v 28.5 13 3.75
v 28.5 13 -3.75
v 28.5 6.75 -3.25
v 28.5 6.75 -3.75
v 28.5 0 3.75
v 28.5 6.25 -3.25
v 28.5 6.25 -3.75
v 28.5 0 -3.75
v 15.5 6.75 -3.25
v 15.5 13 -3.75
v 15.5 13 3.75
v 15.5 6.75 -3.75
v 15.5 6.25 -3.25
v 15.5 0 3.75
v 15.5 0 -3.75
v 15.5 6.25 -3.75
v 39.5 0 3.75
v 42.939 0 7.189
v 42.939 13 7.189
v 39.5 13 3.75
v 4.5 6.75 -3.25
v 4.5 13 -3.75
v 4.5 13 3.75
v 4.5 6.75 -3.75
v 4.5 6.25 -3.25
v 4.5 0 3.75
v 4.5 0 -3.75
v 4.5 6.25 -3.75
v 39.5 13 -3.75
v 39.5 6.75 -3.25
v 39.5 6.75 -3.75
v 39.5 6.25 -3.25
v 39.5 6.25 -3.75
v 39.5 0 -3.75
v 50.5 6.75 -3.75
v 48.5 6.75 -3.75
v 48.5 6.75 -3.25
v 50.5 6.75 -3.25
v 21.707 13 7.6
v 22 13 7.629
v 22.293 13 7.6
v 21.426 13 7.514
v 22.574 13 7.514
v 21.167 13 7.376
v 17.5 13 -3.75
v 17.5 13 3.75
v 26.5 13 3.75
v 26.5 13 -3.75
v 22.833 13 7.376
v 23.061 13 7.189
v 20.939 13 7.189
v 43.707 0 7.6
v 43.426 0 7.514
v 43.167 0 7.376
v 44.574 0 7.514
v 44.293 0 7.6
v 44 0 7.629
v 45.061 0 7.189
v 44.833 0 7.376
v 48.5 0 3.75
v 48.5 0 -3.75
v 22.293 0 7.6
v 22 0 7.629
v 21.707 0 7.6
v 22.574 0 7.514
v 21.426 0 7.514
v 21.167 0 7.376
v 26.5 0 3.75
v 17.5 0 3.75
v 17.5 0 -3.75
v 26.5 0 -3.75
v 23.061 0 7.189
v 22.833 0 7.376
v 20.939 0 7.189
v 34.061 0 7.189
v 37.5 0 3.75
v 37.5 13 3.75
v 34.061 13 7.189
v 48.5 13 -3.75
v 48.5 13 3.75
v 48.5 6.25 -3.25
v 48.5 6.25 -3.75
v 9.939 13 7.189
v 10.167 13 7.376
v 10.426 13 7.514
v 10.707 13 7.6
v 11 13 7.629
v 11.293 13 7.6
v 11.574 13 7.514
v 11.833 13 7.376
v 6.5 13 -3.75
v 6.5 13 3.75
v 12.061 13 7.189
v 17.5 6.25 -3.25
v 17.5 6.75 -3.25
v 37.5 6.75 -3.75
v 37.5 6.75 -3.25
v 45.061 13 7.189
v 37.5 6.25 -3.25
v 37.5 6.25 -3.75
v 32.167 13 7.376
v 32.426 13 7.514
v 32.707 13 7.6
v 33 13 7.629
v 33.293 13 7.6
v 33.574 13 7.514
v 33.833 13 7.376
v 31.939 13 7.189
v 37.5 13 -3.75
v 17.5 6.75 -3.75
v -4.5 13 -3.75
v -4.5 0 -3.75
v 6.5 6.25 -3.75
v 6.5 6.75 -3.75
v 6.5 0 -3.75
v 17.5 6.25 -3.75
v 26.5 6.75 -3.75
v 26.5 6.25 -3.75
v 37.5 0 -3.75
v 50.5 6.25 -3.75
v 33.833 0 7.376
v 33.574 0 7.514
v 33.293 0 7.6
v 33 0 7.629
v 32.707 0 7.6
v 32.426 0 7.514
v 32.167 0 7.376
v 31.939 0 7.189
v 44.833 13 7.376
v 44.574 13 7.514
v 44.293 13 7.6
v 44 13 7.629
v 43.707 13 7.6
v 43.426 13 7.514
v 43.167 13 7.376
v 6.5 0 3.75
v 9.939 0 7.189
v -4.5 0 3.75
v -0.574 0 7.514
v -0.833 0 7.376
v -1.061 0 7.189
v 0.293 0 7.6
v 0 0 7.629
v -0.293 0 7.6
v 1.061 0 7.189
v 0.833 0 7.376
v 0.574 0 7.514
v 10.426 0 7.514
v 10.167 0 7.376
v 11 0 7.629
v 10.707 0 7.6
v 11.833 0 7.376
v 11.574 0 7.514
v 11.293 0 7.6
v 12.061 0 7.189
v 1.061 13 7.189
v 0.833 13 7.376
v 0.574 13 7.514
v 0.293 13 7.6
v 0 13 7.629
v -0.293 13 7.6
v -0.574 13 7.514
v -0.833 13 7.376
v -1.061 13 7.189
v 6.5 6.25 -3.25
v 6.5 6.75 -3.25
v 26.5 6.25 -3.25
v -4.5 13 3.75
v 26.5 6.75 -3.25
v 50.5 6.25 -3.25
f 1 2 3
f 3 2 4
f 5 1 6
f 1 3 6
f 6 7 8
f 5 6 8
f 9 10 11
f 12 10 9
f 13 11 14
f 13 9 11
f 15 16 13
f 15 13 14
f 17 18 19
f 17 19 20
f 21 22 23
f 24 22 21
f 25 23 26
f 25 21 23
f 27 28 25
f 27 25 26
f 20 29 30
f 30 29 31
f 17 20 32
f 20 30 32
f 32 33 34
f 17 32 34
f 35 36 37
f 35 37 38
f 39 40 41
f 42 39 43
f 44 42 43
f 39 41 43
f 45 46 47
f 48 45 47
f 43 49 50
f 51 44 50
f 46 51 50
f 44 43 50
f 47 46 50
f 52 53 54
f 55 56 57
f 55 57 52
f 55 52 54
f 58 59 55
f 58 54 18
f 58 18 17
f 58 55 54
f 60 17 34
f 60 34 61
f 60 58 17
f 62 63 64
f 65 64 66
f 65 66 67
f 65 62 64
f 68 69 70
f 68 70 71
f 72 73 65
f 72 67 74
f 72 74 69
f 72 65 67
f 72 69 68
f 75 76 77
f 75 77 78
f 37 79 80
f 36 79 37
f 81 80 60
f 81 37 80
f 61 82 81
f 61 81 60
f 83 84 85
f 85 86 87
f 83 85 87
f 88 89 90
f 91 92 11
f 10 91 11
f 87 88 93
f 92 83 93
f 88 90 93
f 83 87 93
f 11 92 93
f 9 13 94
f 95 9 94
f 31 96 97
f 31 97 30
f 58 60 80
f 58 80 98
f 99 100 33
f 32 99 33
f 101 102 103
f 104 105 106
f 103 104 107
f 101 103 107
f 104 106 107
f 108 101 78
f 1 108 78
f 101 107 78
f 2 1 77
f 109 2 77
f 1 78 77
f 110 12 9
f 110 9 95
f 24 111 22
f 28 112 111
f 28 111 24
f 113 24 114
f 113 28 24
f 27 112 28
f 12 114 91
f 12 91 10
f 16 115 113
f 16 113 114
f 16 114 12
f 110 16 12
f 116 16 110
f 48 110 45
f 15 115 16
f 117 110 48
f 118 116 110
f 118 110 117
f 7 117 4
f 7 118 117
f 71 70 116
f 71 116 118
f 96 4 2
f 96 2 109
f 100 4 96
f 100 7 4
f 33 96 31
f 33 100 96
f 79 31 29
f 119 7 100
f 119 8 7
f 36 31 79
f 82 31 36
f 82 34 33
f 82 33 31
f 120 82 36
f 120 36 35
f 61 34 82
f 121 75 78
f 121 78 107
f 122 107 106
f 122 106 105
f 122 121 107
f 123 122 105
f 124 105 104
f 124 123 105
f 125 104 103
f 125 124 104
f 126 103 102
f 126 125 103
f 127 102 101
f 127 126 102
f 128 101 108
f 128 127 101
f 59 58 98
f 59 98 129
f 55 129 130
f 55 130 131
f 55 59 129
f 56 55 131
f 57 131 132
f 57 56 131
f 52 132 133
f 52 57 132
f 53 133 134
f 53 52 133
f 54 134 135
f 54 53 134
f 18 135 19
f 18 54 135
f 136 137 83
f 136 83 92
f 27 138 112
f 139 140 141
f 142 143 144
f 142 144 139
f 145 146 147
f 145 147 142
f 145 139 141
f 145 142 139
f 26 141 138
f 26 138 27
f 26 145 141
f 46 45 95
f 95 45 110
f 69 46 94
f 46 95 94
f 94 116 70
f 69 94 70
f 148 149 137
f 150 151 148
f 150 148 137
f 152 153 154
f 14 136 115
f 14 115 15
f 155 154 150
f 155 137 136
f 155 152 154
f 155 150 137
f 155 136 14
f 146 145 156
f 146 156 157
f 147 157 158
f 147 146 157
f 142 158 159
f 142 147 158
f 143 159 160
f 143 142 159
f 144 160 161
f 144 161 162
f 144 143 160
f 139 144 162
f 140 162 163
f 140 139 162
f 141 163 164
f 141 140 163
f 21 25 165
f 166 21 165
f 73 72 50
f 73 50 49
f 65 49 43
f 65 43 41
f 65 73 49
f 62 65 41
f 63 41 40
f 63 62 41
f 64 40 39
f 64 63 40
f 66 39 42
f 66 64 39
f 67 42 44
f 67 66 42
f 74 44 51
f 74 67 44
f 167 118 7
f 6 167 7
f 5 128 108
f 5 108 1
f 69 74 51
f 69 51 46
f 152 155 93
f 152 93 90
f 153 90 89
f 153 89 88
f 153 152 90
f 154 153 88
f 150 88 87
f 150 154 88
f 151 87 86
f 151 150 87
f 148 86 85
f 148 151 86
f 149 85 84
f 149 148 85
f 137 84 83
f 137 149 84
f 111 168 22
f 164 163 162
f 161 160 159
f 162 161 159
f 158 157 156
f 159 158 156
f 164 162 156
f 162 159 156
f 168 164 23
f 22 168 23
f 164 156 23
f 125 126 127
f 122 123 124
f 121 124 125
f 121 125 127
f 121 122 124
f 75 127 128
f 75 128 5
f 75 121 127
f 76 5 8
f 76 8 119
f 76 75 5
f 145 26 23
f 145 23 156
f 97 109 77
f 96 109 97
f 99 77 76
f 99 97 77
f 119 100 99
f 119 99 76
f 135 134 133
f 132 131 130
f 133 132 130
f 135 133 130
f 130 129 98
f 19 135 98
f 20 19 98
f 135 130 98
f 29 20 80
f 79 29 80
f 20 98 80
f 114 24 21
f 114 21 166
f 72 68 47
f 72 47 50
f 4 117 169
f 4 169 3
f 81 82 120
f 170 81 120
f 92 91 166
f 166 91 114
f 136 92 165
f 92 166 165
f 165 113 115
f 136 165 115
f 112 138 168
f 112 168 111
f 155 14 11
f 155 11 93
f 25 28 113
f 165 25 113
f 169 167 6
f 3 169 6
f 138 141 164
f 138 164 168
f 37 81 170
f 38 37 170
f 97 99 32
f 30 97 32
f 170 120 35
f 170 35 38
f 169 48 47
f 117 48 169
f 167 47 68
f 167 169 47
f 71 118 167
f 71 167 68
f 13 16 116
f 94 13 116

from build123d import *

# Parameters (mm, degrees)
F0_W     = 2
F0_H     = 0.5
F1_DEPTH = 13
F2_W     = 2
F2_H     = 6.25
F3_DEPTH = 11.37968


with BuildPart() as f1:
    # F0 (on Front) → F1 (new body)
    with BuildSketch(Plane.XZ):
        Polygon((-4.5, -3.75), (4.5, -3.75), (4.5, -3.25), (4.5, 3.75), (-4.5, 3.75), align=None)
        with Locations((5.5, -3.5)):
            Rectangle(F0_W, F0_H)
        Polygon((6.5, -3.25), (6.5, -3.75), (15.5, -3.75), (15.5, -3.25), (15.5, 3.75), (6.5, 3.75), align=None)
        with BuildLine():
            Line((-1.06066, 7.18934), (-4.5, 3.75))
            Line((-4.5, 3.75), (4.5, 3.75))
            Line((4.5, 3.75), (1.06066, 7.18934))
            ThreePointArc((1.06066, 7.18934), (0, 7.62868), (-1.06066, 7.18934))
        make_face()
        with Locations((16.5, -3.5)):
            Rectangle(F0_W, F0_H)
        with BuildLine():
            Line((9.93934, 7.18934), (6.5, 3.75))
            Line((6.5, 3.75), (15.5, 3.75))
            Line((15.5, 3.75), (12.06066, 7.18934))
            ThreePointArc((12.06066, 7.18934), (11, 7.62868), (9.93934, 7.18934))
        make_face()
        Polygon((17.5, -3.25), (17.5, -3.75), (26.5, -3.75), (26.5, -3.25), (26.5, 3.75), (17.5, 3.75), align=None)
        with Locations((27.5, -3.5)):
            Rectangle(F0_W, F0_H)
        with BuildLine():
            Line((20.93934, 7.18934), (17.5, 3.75))
            Line((17.5, 3.75), (26.5, 3.75))
            Line((26.5, 3.75), (23.06066, 7.18934))
            ThreePointArc((23.06066, 7.18934), (22, 7.62868), (20.93934, 7.18934))
        make_face()
        Polygon((28.5, -3.25), (28.5, -3.75), (37.5, -3.75), (37.5, -3.25), (37.5, 3.75), (28.5, 3.75), align=None)
        with Locations((38.5, -3.5)):
            Rectangle(F0_W, F0_H)
        with BuildLine():
            Line((31.93934, 7.18934), (28.5, 3.75))
            Line((28.5, 3.75), (37.5, 3.75))
            Line((37.5, 3.75), (34.06066, 7.18934))
            ThreePointArc((34.06066, 7.18934), (33, 7.62868), (31.93934, 7.18934))
        make_face()
        Polygon((39.5, -3.25), (39.5, -3.75), (48.5, -3.75), (48.5, -3.25), (48.5, 3.75), (39.5, 3.75), align=None)
        with Locations((49.5, -3.5)):
            Rectangle(F0_W, F0_H)
        with BuildLine():
            Line((42.93934, 7.18934), (39.5, 3.75))
            Line((39.5, 3.75), (48.5, 3.75))
            Line((48.5, 3.75), (45.06066, 7.18934))
            ThreePointArc((45.06066, 7.18934), (44, 7.62868), (42.93934, 7.18934))
        make_face()
    extrude(amount=-F1_DEPTH)

    # F2 (on face) → F3 (cut, through all)
    with BuildSketch(Plane(origin=(0, 0, -3.75), x_dir=(1, 0, 0), z_dir=(0, 0, -1))):
        with Locations((5.5, -3.125)):
            Rectangle(F2_W, F2_H)
        with Locations((5.5, -9.875)):
            Rectangle(F2_W, F2_H)
        with Locations((16.5, -3.125)):
            Rectangle(F2_W, F2_H)
        with Locations((16.5, -9.875)):
            Rectangle(F2_W, F2_H)
        with Locations((27.5, -3.125)):
            Rectangle(F2_W, F2_H)
        with Locations((27.5, -9.875)):
            Rectangle(F2_W, F2_H)
        with Locations((38.5, -3.125)):
            Rectangle(F2_W, F2_H)
        with Locations((38.5, -9.875)):
            Rectangle(F2_W, F2_H)
        with Locations((49.5, -3.125)):
            Rectangle(F2_W, F2_H)
        with Locations((49.5, -9.875)):
            Rectangle(F2_W, F2_H)
    extrude(amount=-F3_DEPTH, mode=Mode.SUBTRACT)


solid = f1.part
